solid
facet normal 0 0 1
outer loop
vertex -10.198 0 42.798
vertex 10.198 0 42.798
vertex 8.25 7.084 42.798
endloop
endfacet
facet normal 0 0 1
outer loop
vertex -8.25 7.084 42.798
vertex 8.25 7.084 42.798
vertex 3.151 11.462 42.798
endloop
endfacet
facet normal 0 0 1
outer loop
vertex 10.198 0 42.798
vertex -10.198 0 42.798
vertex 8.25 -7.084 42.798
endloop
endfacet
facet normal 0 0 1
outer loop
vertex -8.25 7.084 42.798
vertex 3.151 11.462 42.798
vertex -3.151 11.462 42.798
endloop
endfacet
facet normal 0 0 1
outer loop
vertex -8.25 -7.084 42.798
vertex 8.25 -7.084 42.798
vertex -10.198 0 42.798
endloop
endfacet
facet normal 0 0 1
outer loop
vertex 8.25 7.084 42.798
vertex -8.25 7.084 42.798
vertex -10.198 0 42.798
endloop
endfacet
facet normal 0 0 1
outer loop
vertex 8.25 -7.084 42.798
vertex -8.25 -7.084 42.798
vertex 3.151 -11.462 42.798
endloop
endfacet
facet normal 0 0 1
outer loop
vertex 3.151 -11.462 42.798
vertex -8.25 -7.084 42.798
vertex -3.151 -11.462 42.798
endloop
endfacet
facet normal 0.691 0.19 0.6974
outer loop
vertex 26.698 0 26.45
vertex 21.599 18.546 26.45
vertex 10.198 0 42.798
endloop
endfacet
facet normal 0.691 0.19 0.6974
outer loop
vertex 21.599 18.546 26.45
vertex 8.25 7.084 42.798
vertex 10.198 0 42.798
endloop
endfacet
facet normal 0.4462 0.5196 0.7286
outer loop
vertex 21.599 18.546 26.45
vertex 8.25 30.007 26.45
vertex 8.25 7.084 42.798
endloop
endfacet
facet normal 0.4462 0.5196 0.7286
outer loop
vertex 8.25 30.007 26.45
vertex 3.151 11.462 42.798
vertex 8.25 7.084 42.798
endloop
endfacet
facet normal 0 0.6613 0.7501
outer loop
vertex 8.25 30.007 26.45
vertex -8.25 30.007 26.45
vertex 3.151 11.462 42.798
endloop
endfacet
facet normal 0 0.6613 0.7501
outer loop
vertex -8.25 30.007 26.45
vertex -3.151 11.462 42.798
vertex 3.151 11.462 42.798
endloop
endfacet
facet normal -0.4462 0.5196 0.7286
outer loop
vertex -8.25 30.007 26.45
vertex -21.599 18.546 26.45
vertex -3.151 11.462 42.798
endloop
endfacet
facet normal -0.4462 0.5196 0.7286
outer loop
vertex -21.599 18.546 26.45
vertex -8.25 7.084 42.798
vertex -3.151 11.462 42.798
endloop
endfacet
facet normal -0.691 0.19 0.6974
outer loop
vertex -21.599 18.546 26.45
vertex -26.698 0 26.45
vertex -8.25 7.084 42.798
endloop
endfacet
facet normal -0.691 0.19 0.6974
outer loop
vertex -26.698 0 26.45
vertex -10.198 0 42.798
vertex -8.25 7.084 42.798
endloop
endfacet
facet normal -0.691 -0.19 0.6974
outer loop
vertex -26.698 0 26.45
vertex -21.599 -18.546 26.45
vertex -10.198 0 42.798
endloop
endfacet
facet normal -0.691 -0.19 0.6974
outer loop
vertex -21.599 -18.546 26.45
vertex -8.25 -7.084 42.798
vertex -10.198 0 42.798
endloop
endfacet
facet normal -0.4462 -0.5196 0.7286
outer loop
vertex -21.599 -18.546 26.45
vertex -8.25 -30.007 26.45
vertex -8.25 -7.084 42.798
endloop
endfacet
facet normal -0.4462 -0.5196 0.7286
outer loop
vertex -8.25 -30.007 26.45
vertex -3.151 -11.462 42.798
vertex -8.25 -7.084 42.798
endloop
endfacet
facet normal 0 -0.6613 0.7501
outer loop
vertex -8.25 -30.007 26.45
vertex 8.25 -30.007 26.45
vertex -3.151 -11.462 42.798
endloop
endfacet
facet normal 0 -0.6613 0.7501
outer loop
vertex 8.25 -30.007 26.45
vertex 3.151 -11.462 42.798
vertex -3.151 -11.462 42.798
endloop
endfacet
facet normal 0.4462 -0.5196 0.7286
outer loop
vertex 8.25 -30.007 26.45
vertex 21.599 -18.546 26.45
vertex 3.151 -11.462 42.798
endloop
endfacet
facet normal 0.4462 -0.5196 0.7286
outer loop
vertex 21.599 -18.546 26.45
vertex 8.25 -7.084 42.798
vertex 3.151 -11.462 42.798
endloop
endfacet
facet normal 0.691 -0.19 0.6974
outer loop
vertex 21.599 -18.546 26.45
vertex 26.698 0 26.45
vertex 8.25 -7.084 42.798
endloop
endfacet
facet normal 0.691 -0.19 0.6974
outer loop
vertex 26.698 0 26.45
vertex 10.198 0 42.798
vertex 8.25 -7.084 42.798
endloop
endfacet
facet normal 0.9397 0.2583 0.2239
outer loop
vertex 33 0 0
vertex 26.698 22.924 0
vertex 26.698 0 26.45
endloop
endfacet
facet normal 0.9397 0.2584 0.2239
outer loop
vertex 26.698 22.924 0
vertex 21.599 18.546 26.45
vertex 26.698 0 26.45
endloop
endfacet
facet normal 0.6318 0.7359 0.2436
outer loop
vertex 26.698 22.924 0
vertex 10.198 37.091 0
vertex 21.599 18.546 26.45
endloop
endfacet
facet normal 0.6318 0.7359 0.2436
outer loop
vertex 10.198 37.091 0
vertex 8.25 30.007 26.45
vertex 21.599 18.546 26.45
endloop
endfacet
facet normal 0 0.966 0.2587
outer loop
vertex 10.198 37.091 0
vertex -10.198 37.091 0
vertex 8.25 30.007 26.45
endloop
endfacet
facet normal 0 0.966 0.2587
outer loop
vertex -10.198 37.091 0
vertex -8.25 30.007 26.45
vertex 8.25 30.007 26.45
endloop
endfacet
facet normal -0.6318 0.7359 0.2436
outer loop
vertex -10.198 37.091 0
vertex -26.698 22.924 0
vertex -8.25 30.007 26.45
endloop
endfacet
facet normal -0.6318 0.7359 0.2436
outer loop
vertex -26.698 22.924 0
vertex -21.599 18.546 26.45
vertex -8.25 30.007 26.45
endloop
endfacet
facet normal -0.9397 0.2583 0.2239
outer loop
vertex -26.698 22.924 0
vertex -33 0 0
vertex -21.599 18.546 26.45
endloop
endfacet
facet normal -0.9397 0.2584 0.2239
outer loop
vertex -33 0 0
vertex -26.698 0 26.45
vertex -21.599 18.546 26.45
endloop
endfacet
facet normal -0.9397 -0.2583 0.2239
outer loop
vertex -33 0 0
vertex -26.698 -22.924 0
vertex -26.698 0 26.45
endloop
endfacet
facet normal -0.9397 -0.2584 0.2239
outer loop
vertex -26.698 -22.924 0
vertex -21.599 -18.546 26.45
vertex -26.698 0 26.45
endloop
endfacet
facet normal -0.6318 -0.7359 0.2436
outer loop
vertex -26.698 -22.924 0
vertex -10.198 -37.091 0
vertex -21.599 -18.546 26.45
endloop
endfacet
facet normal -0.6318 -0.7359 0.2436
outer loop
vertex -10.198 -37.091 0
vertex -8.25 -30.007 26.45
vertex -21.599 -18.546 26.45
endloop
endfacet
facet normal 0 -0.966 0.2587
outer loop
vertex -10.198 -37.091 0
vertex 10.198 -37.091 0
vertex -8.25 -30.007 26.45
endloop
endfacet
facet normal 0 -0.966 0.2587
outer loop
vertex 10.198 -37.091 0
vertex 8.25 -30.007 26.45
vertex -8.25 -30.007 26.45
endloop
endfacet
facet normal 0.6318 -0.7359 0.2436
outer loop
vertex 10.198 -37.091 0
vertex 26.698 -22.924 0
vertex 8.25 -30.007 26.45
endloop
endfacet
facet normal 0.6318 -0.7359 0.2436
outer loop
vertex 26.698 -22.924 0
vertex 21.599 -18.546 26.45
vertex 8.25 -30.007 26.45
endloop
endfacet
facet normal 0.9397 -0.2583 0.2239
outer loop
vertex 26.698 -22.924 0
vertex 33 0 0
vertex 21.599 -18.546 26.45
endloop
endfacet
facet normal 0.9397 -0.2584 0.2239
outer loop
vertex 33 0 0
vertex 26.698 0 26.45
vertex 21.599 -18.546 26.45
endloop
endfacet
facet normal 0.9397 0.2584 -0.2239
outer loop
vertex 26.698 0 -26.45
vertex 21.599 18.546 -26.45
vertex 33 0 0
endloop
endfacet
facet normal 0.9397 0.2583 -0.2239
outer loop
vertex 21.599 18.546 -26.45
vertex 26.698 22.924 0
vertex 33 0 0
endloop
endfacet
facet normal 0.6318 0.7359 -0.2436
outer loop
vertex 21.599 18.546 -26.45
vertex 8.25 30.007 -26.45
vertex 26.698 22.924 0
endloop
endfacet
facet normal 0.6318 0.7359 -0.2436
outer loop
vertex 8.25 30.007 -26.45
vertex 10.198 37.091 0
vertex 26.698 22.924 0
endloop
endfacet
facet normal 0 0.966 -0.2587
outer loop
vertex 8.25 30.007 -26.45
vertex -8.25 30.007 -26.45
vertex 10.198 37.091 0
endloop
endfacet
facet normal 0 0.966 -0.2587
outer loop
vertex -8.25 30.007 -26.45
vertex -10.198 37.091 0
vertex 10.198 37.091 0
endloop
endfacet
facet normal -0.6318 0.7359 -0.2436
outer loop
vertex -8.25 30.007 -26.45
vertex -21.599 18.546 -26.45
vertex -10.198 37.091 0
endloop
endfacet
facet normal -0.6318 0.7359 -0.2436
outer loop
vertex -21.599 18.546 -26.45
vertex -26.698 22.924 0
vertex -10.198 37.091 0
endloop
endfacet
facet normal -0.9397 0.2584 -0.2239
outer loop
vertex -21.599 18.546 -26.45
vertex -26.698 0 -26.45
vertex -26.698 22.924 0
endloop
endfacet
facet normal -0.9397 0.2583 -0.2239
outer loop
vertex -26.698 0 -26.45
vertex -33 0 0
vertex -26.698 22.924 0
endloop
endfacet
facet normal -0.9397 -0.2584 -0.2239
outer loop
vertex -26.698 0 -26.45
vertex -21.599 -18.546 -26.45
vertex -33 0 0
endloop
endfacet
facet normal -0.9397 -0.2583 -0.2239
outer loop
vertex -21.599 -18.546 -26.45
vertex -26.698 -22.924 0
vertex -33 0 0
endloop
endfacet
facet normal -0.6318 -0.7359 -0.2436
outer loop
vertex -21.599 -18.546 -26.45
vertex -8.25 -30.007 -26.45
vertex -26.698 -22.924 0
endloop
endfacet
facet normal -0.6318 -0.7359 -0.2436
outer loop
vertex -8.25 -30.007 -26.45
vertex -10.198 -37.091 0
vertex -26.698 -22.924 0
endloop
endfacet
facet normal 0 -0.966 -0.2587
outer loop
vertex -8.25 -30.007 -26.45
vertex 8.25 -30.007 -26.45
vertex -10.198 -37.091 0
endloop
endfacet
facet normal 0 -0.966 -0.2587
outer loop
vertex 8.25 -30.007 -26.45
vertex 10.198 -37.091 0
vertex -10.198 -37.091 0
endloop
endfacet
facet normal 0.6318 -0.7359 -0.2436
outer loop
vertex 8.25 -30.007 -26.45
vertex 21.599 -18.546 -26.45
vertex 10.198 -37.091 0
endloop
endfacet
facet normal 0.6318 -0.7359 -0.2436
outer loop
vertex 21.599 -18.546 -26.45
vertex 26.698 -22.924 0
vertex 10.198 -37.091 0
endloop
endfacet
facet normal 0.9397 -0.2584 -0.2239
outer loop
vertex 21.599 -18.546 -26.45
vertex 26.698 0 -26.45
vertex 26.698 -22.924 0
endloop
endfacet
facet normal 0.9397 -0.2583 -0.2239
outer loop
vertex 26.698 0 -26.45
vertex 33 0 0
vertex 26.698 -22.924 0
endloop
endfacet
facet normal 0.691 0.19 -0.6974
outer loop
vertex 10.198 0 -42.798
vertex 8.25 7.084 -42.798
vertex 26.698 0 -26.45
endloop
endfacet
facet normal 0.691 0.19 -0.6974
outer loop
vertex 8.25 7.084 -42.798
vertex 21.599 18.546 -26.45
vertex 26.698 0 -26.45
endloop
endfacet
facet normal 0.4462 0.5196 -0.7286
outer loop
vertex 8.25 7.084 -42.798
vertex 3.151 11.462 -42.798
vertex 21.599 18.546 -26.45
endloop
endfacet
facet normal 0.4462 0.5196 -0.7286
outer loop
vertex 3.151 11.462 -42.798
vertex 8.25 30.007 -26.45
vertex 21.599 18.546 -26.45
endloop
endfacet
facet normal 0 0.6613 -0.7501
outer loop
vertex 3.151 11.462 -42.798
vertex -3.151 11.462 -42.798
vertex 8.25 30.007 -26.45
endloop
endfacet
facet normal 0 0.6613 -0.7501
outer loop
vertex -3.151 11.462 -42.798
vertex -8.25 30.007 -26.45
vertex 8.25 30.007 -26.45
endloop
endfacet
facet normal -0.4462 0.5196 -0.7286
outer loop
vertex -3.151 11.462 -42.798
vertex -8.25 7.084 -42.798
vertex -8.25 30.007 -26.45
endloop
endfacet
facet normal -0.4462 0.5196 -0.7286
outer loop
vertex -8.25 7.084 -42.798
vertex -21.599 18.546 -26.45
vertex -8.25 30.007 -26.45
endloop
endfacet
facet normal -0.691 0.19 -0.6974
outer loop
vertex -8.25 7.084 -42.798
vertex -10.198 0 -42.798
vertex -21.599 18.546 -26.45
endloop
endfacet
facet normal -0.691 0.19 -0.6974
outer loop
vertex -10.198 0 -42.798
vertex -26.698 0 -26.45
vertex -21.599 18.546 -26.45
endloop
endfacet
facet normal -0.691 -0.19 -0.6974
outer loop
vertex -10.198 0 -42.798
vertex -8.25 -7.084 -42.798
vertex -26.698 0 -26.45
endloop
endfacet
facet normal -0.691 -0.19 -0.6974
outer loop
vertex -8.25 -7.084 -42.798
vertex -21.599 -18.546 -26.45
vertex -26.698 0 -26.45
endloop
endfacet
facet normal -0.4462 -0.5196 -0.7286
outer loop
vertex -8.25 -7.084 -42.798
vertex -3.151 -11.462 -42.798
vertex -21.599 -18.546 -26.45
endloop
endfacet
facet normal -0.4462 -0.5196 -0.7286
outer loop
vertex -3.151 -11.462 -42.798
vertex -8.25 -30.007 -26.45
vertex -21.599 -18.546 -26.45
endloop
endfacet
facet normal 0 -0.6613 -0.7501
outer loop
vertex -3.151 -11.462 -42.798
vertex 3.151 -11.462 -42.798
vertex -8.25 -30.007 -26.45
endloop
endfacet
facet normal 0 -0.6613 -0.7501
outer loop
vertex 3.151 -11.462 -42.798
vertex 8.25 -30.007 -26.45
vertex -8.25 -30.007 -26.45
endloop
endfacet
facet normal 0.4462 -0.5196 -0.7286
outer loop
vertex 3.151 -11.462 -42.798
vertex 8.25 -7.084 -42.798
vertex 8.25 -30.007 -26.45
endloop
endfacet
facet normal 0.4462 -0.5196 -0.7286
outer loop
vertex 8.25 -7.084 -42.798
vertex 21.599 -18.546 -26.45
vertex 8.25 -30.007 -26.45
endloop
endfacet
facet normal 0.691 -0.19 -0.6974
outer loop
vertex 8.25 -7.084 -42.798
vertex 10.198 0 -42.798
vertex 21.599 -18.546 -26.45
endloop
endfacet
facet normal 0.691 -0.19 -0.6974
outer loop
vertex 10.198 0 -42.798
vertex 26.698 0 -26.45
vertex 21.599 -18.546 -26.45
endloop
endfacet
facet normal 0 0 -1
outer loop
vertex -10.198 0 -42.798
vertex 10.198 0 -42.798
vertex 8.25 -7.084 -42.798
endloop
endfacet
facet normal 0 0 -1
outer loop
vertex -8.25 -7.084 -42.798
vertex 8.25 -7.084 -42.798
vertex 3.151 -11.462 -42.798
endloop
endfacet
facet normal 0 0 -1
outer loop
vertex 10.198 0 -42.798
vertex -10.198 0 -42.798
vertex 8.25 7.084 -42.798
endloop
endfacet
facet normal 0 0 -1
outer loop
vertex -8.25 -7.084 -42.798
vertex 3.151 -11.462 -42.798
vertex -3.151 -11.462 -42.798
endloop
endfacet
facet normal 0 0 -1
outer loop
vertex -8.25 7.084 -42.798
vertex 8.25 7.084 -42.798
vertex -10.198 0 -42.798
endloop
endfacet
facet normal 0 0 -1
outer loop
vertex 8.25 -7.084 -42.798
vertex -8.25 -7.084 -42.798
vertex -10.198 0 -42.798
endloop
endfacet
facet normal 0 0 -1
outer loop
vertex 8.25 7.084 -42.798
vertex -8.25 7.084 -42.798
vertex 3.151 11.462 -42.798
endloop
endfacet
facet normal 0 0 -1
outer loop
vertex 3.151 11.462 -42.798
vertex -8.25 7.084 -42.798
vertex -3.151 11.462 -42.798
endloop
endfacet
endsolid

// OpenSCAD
// Generated by SolidPython 1.0.1 on 2020-07-29 00:46:49


scale(v = [11, 13, 15]) {
	sphere(r = 3);
}
/***********************************************
*********      SolidPython code:      **********
************************************************
 
# import packages: SolidPython
from solid import *
from solid.utils import *
from itertools import chain, combinations, permutations


class Resize:

    def __init__(self, scad_file):
        self.scad_file = scad_file
        #self.scad_file = import_scad(scad_file)
        # cone/cylinder param:
        self.r1 = 0
        self.r2 = 0
        self.h = 0
        # rectangular prism param:
        self.w = 0
        self.l = 0
        # ellipse param:
        self.r = 0

    # import OpenScad code (file name corresponds to shape)


    # classify shape + parameters
    def assign(self, param1, param2, param3):
        if self.scad_file == 'cone.scad':
            self.r1 = param1
            self.r2 = param2
            self.h = param3
        elif self.scad_file == 'cylinder.scad':
            self.r1 = param1
            self.r2 = param2
            self.h = param3
        elif self.scad_file == 'rectangularPrism.scad':
            self.h = param1
            self.l = param2
            self.w = param3
        else:
            self.r = param1
            self.h = param2

    # resize parameters
    def iterate(self):
        x = range(3, 20, 2)
        i = 1
        if self.scad_file == 'cone.scad':
            tempList = list(permutations(x, 2))
            for temp in tempList:
                param1 = temp[0]
                param2 = temp[1]
                filepath = 'produced_scad_files/' + 'cone' + str(param1) + '_' + str(param2) + '_' + '.scad'
                scad_render_to_file(cylinder(h=param1, r1=param2, r2=0), filepath)

        elif self.scad_file == 'cylinder.scad':
            tempList = list(permutations(x, 3))
            for temp in tempList:
                param1 = temp[0]
                param2 = temp[1]
                filepath = 'produced_scad_files/' + 'cylinder' + str(param1) + '_' + str(param2) + '_' + '.scad'
                scad_render_to_file(cylinder(h=param1, r1=param2, r2=param2), filepath)

        elif self.scad_file == 'rectangularPrism.scad':
            tempList = list(permutations(x, 3))
            for temp in tempList:
                param1 = temp[0]
                param2 = temp[1]
                param3 = temp[2]
                filepath = 'produced_scad_files/' + 'rectangularPrism' + str(param1) + '_' + str(param2) + '_' + str(
                    param3) + '.scad'
                scad_render_to_file(cube(size=(param1, param2, param3)), filepath)

        elif self.scad_file == 'ellipse.scad':
            tempList = list(permutations(x, 4))
            for temp in tempList:
                param1 = temp[0]
                param2 = temp[1]
                param3 = temp[2]
                param4 = temp[3]
                filepath = 'produced_scad_files/' + 'ellipse' + str(param1) + '_' + str(param2) + '_' + str(param3) + '_' + str(param4) + '.scad'
                scad_render_to_file(scale([param1, param2, param3])(sphere(r=param4)), filepath)

    def render_to_scadfile(self):
        scad_render_to_file(scad, 'example.scad') 
 
************************************************/
